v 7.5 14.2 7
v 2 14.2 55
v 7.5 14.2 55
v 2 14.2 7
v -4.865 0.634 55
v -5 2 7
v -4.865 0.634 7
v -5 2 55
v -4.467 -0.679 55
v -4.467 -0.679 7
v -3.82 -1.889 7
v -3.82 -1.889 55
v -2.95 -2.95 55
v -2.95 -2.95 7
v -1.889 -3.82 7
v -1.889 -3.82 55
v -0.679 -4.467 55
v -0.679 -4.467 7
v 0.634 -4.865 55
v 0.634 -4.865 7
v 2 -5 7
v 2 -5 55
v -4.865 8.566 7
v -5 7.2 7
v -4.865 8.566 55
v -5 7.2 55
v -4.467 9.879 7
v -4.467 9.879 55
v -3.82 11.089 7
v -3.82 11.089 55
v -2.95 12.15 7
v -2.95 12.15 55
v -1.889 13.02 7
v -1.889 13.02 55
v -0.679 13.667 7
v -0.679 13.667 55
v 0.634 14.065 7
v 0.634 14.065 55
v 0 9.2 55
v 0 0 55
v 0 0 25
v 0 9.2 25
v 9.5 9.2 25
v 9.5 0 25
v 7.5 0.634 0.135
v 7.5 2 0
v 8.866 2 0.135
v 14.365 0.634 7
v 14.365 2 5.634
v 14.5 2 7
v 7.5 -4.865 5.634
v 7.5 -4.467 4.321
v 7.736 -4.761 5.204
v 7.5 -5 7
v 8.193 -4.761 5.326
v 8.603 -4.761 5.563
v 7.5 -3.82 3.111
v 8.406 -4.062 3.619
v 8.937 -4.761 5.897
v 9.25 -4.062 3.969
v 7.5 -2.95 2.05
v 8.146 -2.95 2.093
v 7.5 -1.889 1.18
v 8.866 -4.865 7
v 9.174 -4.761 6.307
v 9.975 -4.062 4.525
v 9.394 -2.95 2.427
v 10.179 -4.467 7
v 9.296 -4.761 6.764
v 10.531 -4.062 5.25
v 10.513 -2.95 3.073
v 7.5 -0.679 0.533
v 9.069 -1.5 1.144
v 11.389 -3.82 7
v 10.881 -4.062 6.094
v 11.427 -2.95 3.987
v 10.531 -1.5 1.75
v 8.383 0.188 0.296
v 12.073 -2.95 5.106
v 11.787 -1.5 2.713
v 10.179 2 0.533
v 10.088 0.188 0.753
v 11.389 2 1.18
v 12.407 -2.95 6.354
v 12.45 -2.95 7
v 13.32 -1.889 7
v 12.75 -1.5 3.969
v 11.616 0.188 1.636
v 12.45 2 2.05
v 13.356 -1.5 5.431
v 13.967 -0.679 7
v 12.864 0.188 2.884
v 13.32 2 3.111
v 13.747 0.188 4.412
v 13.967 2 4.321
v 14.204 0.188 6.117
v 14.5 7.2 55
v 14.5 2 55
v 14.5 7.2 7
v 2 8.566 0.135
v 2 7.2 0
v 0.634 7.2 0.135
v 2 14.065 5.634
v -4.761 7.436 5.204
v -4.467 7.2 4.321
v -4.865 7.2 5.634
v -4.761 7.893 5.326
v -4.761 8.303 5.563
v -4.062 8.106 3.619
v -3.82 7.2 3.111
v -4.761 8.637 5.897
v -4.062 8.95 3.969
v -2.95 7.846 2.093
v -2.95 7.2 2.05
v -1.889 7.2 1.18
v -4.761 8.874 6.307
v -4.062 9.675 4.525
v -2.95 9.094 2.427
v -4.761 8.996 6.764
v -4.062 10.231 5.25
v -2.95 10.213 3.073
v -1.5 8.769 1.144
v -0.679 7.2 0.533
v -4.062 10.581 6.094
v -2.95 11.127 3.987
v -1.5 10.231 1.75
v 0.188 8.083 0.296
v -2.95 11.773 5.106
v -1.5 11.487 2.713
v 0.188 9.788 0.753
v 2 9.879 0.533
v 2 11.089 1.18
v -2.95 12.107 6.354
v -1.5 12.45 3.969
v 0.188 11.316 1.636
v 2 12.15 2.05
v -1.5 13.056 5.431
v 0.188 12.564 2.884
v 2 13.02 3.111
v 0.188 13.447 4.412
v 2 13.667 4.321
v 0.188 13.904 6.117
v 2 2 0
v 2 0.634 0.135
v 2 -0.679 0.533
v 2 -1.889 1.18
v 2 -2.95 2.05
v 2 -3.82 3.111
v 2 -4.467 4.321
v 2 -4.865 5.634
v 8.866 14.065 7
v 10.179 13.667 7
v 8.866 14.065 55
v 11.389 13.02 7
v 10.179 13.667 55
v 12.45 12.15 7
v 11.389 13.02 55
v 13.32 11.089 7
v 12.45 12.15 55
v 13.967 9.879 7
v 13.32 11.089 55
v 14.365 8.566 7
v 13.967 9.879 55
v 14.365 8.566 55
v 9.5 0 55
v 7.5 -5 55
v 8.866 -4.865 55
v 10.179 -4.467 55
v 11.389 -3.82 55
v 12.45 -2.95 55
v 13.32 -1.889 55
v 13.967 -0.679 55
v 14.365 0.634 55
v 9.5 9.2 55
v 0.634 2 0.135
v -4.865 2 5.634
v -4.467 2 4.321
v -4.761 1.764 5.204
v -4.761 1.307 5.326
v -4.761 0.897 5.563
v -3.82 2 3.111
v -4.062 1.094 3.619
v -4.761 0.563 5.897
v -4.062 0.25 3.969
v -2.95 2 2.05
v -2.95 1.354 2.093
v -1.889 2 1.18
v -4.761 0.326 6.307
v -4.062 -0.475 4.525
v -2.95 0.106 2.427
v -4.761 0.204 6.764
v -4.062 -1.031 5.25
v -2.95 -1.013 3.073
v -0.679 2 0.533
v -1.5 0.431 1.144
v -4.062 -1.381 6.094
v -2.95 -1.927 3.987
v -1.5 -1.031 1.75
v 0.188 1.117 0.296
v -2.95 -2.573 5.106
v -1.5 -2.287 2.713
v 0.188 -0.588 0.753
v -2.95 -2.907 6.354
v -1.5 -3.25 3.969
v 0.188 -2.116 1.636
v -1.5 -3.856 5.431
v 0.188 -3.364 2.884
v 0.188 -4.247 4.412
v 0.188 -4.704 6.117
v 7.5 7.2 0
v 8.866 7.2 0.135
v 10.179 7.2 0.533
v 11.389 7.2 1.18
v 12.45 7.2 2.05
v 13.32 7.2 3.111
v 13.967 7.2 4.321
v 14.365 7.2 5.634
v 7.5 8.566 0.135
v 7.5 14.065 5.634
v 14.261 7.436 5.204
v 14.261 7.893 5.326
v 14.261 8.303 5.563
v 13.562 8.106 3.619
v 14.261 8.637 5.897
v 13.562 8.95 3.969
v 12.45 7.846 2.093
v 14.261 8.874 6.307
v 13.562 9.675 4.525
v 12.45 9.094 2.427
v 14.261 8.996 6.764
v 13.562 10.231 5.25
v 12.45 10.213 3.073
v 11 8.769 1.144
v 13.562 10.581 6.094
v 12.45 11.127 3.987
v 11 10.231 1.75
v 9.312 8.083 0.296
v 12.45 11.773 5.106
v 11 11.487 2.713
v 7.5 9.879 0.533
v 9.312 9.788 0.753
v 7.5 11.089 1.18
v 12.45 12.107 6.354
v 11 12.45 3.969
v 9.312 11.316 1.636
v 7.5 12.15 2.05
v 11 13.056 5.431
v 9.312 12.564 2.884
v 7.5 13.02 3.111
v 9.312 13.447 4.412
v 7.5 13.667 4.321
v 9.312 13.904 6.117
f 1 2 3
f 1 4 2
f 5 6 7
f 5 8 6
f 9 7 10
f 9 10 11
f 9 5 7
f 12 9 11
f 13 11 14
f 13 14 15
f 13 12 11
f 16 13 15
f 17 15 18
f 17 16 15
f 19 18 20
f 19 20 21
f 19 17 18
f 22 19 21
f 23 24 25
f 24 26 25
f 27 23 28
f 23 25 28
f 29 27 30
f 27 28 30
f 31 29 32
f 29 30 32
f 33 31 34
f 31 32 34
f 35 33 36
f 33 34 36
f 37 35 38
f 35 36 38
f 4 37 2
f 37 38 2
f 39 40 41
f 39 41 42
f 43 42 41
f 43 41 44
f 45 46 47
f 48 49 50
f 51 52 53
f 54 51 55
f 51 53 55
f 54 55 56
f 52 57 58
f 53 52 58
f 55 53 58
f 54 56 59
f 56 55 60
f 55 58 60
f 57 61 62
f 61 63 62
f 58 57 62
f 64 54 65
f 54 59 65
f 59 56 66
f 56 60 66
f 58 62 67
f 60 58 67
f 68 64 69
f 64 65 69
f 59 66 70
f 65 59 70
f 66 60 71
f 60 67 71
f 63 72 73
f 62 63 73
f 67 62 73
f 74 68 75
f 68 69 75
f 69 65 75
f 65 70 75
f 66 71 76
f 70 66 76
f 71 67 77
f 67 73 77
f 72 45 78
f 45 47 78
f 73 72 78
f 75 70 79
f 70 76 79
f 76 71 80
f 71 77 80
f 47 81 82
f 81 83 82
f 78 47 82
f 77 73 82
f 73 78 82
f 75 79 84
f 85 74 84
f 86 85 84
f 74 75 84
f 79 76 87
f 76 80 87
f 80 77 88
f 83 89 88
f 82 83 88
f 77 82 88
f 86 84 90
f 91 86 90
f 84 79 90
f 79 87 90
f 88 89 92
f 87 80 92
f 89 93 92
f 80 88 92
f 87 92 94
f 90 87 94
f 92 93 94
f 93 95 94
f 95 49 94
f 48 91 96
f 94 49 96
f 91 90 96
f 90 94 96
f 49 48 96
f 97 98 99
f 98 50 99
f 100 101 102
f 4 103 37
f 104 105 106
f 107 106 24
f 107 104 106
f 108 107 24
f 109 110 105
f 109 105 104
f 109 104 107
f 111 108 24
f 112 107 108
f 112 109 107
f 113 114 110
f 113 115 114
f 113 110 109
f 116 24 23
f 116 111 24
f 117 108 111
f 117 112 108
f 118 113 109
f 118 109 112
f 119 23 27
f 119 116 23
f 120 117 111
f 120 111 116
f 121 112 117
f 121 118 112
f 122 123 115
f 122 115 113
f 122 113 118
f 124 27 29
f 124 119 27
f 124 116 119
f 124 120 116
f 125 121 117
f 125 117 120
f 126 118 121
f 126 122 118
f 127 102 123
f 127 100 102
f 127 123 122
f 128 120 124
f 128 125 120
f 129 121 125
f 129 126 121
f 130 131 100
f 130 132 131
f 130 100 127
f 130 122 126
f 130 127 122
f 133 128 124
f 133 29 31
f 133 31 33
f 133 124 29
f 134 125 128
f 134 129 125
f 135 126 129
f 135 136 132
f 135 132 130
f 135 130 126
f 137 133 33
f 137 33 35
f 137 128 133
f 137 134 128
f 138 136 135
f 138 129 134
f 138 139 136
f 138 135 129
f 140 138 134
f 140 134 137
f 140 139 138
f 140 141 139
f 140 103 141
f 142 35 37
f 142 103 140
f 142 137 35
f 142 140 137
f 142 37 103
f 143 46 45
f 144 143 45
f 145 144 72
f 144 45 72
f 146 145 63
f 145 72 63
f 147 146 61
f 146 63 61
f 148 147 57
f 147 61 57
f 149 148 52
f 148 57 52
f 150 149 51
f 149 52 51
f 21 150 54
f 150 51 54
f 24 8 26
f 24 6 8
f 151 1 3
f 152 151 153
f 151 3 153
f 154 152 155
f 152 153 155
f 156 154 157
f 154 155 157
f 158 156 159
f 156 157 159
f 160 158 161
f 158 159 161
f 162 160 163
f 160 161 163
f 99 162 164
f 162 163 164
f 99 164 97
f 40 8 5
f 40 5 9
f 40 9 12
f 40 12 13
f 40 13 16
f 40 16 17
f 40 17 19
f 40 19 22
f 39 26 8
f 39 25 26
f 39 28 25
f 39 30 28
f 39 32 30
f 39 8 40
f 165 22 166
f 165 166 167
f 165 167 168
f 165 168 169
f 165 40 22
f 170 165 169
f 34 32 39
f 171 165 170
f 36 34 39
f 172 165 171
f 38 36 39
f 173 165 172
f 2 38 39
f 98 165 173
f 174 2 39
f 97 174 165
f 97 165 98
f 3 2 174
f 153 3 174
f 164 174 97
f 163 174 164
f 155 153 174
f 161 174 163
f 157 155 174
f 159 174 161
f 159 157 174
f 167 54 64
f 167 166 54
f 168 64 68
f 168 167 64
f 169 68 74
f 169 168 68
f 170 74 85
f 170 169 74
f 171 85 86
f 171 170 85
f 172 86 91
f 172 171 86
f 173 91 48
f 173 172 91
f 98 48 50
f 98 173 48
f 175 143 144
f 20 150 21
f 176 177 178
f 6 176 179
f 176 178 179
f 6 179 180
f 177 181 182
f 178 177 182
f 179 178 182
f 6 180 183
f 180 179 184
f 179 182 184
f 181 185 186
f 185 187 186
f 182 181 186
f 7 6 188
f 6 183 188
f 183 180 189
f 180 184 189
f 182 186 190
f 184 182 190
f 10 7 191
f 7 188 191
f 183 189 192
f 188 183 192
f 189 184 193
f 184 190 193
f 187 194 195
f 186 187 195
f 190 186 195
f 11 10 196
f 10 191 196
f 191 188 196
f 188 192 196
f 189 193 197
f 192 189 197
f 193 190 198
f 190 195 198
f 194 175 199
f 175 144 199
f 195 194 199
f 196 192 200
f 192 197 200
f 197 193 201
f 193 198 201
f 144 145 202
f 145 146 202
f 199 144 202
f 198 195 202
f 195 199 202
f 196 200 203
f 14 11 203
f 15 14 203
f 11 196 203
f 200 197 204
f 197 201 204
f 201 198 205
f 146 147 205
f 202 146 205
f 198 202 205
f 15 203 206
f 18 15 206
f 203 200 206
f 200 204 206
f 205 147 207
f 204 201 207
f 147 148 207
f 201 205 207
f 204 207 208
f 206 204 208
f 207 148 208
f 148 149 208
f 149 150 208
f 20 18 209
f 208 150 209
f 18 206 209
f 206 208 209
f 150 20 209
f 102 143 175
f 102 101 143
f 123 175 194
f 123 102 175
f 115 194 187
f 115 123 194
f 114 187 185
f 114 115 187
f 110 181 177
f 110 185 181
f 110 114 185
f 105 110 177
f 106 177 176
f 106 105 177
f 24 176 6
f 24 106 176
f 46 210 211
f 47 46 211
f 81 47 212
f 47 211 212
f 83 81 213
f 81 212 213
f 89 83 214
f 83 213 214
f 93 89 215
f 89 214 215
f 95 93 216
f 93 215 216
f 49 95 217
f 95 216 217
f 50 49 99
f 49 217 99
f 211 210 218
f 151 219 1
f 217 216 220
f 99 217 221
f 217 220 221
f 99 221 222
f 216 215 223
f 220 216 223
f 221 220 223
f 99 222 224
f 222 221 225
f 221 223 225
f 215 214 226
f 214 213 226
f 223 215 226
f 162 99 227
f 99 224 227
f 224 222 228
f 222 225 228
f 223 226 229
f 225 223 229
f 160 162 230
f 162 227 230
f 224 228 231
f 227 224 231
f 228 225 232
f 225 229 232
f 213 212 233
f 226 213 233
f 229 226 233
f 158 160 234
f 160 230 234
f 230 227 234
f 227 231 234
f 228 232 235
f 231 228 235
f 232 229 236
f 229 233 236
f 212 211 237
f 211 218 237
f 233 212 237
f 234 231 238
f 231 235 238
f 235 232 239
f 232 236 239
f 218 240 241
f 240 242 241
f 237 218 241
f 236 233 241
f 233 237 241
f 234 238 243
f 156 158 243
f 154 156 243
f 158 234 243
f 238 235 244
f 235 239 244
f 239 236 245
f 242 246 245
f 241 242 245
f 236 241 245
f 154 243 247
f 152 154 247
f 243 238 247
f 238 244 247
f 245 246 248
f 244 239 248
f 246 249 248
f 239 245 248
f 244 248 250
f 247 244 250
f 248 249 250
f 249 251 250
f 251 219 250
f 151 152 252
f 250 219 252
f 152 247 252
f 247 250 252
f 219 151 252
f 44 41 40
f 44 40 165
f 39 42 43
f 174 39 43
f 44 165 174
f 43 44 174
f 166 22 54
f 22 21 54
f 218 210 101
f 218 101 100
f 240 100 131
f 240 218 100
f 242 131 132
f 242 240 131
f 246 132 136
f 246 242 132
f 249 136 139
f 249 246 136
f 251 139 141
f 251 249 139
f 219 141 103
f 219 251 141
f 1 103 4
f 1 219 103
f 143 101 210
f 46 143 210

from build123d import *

# Parameters (mm, degrees)
SKETCH1_W           = 19.5
SKETCH1_H           = 19.2
SKETCH1_W_2         = 9.5
SKETCH1_H_2         = 9.2
BOSS_EXTRUDE1_DEPTH = 55
SKETCH1_2_W         = 9.5
SKETCH1_2_H         = 9.2
BOSS_EXTRUDE2_DEPTH = 25
FILLET2_R           = 7


with BuildPart() as part:
    # Sketch1 → Boss-Extrude1 (new body)
    with BuildSketch(Plane.XY):
        with Locations((4.75, 4.6)):
            Rectangle(SKETCH1_W, SKETCH1_H)
        with Locations((4.75, 4.6)):
            Rectangle(SKETCH1_W_2, SKETCH1_H_2, mode=Mode.SUBTRACT)
    extrude(amount=BOSS_EXTRUDE1_DEPTH)

    # Sketch1<2> → Boss-Extrude2 (add)
    with BuildSketch(Plane.XY):
        with Locations((4.75, 4.6)):
            Rectangle(SKETCH1_2_W, SKETCH1_2_H)
    extrude(amount=BOSS_EXTRUDE2_DEPTH)

    # Fillet2
    fillet2_edges = [part.edges().sort_by_distance(p)[0] for p in [
        (4.75, 14.2, 0),
        (14.5, 4.6, 0),
        (4.75, -5, 0),
        (-5, 4.6, 0),
        (-5, 14.2, 27.5),
        (14.5, 14.2, 27.5),
        (14.5, -5, 27.5),
        (-5, -5, 27.5),
    ]]
    fillet(fillet2_edges, radius=FILLET2_R)


solid = part.part
